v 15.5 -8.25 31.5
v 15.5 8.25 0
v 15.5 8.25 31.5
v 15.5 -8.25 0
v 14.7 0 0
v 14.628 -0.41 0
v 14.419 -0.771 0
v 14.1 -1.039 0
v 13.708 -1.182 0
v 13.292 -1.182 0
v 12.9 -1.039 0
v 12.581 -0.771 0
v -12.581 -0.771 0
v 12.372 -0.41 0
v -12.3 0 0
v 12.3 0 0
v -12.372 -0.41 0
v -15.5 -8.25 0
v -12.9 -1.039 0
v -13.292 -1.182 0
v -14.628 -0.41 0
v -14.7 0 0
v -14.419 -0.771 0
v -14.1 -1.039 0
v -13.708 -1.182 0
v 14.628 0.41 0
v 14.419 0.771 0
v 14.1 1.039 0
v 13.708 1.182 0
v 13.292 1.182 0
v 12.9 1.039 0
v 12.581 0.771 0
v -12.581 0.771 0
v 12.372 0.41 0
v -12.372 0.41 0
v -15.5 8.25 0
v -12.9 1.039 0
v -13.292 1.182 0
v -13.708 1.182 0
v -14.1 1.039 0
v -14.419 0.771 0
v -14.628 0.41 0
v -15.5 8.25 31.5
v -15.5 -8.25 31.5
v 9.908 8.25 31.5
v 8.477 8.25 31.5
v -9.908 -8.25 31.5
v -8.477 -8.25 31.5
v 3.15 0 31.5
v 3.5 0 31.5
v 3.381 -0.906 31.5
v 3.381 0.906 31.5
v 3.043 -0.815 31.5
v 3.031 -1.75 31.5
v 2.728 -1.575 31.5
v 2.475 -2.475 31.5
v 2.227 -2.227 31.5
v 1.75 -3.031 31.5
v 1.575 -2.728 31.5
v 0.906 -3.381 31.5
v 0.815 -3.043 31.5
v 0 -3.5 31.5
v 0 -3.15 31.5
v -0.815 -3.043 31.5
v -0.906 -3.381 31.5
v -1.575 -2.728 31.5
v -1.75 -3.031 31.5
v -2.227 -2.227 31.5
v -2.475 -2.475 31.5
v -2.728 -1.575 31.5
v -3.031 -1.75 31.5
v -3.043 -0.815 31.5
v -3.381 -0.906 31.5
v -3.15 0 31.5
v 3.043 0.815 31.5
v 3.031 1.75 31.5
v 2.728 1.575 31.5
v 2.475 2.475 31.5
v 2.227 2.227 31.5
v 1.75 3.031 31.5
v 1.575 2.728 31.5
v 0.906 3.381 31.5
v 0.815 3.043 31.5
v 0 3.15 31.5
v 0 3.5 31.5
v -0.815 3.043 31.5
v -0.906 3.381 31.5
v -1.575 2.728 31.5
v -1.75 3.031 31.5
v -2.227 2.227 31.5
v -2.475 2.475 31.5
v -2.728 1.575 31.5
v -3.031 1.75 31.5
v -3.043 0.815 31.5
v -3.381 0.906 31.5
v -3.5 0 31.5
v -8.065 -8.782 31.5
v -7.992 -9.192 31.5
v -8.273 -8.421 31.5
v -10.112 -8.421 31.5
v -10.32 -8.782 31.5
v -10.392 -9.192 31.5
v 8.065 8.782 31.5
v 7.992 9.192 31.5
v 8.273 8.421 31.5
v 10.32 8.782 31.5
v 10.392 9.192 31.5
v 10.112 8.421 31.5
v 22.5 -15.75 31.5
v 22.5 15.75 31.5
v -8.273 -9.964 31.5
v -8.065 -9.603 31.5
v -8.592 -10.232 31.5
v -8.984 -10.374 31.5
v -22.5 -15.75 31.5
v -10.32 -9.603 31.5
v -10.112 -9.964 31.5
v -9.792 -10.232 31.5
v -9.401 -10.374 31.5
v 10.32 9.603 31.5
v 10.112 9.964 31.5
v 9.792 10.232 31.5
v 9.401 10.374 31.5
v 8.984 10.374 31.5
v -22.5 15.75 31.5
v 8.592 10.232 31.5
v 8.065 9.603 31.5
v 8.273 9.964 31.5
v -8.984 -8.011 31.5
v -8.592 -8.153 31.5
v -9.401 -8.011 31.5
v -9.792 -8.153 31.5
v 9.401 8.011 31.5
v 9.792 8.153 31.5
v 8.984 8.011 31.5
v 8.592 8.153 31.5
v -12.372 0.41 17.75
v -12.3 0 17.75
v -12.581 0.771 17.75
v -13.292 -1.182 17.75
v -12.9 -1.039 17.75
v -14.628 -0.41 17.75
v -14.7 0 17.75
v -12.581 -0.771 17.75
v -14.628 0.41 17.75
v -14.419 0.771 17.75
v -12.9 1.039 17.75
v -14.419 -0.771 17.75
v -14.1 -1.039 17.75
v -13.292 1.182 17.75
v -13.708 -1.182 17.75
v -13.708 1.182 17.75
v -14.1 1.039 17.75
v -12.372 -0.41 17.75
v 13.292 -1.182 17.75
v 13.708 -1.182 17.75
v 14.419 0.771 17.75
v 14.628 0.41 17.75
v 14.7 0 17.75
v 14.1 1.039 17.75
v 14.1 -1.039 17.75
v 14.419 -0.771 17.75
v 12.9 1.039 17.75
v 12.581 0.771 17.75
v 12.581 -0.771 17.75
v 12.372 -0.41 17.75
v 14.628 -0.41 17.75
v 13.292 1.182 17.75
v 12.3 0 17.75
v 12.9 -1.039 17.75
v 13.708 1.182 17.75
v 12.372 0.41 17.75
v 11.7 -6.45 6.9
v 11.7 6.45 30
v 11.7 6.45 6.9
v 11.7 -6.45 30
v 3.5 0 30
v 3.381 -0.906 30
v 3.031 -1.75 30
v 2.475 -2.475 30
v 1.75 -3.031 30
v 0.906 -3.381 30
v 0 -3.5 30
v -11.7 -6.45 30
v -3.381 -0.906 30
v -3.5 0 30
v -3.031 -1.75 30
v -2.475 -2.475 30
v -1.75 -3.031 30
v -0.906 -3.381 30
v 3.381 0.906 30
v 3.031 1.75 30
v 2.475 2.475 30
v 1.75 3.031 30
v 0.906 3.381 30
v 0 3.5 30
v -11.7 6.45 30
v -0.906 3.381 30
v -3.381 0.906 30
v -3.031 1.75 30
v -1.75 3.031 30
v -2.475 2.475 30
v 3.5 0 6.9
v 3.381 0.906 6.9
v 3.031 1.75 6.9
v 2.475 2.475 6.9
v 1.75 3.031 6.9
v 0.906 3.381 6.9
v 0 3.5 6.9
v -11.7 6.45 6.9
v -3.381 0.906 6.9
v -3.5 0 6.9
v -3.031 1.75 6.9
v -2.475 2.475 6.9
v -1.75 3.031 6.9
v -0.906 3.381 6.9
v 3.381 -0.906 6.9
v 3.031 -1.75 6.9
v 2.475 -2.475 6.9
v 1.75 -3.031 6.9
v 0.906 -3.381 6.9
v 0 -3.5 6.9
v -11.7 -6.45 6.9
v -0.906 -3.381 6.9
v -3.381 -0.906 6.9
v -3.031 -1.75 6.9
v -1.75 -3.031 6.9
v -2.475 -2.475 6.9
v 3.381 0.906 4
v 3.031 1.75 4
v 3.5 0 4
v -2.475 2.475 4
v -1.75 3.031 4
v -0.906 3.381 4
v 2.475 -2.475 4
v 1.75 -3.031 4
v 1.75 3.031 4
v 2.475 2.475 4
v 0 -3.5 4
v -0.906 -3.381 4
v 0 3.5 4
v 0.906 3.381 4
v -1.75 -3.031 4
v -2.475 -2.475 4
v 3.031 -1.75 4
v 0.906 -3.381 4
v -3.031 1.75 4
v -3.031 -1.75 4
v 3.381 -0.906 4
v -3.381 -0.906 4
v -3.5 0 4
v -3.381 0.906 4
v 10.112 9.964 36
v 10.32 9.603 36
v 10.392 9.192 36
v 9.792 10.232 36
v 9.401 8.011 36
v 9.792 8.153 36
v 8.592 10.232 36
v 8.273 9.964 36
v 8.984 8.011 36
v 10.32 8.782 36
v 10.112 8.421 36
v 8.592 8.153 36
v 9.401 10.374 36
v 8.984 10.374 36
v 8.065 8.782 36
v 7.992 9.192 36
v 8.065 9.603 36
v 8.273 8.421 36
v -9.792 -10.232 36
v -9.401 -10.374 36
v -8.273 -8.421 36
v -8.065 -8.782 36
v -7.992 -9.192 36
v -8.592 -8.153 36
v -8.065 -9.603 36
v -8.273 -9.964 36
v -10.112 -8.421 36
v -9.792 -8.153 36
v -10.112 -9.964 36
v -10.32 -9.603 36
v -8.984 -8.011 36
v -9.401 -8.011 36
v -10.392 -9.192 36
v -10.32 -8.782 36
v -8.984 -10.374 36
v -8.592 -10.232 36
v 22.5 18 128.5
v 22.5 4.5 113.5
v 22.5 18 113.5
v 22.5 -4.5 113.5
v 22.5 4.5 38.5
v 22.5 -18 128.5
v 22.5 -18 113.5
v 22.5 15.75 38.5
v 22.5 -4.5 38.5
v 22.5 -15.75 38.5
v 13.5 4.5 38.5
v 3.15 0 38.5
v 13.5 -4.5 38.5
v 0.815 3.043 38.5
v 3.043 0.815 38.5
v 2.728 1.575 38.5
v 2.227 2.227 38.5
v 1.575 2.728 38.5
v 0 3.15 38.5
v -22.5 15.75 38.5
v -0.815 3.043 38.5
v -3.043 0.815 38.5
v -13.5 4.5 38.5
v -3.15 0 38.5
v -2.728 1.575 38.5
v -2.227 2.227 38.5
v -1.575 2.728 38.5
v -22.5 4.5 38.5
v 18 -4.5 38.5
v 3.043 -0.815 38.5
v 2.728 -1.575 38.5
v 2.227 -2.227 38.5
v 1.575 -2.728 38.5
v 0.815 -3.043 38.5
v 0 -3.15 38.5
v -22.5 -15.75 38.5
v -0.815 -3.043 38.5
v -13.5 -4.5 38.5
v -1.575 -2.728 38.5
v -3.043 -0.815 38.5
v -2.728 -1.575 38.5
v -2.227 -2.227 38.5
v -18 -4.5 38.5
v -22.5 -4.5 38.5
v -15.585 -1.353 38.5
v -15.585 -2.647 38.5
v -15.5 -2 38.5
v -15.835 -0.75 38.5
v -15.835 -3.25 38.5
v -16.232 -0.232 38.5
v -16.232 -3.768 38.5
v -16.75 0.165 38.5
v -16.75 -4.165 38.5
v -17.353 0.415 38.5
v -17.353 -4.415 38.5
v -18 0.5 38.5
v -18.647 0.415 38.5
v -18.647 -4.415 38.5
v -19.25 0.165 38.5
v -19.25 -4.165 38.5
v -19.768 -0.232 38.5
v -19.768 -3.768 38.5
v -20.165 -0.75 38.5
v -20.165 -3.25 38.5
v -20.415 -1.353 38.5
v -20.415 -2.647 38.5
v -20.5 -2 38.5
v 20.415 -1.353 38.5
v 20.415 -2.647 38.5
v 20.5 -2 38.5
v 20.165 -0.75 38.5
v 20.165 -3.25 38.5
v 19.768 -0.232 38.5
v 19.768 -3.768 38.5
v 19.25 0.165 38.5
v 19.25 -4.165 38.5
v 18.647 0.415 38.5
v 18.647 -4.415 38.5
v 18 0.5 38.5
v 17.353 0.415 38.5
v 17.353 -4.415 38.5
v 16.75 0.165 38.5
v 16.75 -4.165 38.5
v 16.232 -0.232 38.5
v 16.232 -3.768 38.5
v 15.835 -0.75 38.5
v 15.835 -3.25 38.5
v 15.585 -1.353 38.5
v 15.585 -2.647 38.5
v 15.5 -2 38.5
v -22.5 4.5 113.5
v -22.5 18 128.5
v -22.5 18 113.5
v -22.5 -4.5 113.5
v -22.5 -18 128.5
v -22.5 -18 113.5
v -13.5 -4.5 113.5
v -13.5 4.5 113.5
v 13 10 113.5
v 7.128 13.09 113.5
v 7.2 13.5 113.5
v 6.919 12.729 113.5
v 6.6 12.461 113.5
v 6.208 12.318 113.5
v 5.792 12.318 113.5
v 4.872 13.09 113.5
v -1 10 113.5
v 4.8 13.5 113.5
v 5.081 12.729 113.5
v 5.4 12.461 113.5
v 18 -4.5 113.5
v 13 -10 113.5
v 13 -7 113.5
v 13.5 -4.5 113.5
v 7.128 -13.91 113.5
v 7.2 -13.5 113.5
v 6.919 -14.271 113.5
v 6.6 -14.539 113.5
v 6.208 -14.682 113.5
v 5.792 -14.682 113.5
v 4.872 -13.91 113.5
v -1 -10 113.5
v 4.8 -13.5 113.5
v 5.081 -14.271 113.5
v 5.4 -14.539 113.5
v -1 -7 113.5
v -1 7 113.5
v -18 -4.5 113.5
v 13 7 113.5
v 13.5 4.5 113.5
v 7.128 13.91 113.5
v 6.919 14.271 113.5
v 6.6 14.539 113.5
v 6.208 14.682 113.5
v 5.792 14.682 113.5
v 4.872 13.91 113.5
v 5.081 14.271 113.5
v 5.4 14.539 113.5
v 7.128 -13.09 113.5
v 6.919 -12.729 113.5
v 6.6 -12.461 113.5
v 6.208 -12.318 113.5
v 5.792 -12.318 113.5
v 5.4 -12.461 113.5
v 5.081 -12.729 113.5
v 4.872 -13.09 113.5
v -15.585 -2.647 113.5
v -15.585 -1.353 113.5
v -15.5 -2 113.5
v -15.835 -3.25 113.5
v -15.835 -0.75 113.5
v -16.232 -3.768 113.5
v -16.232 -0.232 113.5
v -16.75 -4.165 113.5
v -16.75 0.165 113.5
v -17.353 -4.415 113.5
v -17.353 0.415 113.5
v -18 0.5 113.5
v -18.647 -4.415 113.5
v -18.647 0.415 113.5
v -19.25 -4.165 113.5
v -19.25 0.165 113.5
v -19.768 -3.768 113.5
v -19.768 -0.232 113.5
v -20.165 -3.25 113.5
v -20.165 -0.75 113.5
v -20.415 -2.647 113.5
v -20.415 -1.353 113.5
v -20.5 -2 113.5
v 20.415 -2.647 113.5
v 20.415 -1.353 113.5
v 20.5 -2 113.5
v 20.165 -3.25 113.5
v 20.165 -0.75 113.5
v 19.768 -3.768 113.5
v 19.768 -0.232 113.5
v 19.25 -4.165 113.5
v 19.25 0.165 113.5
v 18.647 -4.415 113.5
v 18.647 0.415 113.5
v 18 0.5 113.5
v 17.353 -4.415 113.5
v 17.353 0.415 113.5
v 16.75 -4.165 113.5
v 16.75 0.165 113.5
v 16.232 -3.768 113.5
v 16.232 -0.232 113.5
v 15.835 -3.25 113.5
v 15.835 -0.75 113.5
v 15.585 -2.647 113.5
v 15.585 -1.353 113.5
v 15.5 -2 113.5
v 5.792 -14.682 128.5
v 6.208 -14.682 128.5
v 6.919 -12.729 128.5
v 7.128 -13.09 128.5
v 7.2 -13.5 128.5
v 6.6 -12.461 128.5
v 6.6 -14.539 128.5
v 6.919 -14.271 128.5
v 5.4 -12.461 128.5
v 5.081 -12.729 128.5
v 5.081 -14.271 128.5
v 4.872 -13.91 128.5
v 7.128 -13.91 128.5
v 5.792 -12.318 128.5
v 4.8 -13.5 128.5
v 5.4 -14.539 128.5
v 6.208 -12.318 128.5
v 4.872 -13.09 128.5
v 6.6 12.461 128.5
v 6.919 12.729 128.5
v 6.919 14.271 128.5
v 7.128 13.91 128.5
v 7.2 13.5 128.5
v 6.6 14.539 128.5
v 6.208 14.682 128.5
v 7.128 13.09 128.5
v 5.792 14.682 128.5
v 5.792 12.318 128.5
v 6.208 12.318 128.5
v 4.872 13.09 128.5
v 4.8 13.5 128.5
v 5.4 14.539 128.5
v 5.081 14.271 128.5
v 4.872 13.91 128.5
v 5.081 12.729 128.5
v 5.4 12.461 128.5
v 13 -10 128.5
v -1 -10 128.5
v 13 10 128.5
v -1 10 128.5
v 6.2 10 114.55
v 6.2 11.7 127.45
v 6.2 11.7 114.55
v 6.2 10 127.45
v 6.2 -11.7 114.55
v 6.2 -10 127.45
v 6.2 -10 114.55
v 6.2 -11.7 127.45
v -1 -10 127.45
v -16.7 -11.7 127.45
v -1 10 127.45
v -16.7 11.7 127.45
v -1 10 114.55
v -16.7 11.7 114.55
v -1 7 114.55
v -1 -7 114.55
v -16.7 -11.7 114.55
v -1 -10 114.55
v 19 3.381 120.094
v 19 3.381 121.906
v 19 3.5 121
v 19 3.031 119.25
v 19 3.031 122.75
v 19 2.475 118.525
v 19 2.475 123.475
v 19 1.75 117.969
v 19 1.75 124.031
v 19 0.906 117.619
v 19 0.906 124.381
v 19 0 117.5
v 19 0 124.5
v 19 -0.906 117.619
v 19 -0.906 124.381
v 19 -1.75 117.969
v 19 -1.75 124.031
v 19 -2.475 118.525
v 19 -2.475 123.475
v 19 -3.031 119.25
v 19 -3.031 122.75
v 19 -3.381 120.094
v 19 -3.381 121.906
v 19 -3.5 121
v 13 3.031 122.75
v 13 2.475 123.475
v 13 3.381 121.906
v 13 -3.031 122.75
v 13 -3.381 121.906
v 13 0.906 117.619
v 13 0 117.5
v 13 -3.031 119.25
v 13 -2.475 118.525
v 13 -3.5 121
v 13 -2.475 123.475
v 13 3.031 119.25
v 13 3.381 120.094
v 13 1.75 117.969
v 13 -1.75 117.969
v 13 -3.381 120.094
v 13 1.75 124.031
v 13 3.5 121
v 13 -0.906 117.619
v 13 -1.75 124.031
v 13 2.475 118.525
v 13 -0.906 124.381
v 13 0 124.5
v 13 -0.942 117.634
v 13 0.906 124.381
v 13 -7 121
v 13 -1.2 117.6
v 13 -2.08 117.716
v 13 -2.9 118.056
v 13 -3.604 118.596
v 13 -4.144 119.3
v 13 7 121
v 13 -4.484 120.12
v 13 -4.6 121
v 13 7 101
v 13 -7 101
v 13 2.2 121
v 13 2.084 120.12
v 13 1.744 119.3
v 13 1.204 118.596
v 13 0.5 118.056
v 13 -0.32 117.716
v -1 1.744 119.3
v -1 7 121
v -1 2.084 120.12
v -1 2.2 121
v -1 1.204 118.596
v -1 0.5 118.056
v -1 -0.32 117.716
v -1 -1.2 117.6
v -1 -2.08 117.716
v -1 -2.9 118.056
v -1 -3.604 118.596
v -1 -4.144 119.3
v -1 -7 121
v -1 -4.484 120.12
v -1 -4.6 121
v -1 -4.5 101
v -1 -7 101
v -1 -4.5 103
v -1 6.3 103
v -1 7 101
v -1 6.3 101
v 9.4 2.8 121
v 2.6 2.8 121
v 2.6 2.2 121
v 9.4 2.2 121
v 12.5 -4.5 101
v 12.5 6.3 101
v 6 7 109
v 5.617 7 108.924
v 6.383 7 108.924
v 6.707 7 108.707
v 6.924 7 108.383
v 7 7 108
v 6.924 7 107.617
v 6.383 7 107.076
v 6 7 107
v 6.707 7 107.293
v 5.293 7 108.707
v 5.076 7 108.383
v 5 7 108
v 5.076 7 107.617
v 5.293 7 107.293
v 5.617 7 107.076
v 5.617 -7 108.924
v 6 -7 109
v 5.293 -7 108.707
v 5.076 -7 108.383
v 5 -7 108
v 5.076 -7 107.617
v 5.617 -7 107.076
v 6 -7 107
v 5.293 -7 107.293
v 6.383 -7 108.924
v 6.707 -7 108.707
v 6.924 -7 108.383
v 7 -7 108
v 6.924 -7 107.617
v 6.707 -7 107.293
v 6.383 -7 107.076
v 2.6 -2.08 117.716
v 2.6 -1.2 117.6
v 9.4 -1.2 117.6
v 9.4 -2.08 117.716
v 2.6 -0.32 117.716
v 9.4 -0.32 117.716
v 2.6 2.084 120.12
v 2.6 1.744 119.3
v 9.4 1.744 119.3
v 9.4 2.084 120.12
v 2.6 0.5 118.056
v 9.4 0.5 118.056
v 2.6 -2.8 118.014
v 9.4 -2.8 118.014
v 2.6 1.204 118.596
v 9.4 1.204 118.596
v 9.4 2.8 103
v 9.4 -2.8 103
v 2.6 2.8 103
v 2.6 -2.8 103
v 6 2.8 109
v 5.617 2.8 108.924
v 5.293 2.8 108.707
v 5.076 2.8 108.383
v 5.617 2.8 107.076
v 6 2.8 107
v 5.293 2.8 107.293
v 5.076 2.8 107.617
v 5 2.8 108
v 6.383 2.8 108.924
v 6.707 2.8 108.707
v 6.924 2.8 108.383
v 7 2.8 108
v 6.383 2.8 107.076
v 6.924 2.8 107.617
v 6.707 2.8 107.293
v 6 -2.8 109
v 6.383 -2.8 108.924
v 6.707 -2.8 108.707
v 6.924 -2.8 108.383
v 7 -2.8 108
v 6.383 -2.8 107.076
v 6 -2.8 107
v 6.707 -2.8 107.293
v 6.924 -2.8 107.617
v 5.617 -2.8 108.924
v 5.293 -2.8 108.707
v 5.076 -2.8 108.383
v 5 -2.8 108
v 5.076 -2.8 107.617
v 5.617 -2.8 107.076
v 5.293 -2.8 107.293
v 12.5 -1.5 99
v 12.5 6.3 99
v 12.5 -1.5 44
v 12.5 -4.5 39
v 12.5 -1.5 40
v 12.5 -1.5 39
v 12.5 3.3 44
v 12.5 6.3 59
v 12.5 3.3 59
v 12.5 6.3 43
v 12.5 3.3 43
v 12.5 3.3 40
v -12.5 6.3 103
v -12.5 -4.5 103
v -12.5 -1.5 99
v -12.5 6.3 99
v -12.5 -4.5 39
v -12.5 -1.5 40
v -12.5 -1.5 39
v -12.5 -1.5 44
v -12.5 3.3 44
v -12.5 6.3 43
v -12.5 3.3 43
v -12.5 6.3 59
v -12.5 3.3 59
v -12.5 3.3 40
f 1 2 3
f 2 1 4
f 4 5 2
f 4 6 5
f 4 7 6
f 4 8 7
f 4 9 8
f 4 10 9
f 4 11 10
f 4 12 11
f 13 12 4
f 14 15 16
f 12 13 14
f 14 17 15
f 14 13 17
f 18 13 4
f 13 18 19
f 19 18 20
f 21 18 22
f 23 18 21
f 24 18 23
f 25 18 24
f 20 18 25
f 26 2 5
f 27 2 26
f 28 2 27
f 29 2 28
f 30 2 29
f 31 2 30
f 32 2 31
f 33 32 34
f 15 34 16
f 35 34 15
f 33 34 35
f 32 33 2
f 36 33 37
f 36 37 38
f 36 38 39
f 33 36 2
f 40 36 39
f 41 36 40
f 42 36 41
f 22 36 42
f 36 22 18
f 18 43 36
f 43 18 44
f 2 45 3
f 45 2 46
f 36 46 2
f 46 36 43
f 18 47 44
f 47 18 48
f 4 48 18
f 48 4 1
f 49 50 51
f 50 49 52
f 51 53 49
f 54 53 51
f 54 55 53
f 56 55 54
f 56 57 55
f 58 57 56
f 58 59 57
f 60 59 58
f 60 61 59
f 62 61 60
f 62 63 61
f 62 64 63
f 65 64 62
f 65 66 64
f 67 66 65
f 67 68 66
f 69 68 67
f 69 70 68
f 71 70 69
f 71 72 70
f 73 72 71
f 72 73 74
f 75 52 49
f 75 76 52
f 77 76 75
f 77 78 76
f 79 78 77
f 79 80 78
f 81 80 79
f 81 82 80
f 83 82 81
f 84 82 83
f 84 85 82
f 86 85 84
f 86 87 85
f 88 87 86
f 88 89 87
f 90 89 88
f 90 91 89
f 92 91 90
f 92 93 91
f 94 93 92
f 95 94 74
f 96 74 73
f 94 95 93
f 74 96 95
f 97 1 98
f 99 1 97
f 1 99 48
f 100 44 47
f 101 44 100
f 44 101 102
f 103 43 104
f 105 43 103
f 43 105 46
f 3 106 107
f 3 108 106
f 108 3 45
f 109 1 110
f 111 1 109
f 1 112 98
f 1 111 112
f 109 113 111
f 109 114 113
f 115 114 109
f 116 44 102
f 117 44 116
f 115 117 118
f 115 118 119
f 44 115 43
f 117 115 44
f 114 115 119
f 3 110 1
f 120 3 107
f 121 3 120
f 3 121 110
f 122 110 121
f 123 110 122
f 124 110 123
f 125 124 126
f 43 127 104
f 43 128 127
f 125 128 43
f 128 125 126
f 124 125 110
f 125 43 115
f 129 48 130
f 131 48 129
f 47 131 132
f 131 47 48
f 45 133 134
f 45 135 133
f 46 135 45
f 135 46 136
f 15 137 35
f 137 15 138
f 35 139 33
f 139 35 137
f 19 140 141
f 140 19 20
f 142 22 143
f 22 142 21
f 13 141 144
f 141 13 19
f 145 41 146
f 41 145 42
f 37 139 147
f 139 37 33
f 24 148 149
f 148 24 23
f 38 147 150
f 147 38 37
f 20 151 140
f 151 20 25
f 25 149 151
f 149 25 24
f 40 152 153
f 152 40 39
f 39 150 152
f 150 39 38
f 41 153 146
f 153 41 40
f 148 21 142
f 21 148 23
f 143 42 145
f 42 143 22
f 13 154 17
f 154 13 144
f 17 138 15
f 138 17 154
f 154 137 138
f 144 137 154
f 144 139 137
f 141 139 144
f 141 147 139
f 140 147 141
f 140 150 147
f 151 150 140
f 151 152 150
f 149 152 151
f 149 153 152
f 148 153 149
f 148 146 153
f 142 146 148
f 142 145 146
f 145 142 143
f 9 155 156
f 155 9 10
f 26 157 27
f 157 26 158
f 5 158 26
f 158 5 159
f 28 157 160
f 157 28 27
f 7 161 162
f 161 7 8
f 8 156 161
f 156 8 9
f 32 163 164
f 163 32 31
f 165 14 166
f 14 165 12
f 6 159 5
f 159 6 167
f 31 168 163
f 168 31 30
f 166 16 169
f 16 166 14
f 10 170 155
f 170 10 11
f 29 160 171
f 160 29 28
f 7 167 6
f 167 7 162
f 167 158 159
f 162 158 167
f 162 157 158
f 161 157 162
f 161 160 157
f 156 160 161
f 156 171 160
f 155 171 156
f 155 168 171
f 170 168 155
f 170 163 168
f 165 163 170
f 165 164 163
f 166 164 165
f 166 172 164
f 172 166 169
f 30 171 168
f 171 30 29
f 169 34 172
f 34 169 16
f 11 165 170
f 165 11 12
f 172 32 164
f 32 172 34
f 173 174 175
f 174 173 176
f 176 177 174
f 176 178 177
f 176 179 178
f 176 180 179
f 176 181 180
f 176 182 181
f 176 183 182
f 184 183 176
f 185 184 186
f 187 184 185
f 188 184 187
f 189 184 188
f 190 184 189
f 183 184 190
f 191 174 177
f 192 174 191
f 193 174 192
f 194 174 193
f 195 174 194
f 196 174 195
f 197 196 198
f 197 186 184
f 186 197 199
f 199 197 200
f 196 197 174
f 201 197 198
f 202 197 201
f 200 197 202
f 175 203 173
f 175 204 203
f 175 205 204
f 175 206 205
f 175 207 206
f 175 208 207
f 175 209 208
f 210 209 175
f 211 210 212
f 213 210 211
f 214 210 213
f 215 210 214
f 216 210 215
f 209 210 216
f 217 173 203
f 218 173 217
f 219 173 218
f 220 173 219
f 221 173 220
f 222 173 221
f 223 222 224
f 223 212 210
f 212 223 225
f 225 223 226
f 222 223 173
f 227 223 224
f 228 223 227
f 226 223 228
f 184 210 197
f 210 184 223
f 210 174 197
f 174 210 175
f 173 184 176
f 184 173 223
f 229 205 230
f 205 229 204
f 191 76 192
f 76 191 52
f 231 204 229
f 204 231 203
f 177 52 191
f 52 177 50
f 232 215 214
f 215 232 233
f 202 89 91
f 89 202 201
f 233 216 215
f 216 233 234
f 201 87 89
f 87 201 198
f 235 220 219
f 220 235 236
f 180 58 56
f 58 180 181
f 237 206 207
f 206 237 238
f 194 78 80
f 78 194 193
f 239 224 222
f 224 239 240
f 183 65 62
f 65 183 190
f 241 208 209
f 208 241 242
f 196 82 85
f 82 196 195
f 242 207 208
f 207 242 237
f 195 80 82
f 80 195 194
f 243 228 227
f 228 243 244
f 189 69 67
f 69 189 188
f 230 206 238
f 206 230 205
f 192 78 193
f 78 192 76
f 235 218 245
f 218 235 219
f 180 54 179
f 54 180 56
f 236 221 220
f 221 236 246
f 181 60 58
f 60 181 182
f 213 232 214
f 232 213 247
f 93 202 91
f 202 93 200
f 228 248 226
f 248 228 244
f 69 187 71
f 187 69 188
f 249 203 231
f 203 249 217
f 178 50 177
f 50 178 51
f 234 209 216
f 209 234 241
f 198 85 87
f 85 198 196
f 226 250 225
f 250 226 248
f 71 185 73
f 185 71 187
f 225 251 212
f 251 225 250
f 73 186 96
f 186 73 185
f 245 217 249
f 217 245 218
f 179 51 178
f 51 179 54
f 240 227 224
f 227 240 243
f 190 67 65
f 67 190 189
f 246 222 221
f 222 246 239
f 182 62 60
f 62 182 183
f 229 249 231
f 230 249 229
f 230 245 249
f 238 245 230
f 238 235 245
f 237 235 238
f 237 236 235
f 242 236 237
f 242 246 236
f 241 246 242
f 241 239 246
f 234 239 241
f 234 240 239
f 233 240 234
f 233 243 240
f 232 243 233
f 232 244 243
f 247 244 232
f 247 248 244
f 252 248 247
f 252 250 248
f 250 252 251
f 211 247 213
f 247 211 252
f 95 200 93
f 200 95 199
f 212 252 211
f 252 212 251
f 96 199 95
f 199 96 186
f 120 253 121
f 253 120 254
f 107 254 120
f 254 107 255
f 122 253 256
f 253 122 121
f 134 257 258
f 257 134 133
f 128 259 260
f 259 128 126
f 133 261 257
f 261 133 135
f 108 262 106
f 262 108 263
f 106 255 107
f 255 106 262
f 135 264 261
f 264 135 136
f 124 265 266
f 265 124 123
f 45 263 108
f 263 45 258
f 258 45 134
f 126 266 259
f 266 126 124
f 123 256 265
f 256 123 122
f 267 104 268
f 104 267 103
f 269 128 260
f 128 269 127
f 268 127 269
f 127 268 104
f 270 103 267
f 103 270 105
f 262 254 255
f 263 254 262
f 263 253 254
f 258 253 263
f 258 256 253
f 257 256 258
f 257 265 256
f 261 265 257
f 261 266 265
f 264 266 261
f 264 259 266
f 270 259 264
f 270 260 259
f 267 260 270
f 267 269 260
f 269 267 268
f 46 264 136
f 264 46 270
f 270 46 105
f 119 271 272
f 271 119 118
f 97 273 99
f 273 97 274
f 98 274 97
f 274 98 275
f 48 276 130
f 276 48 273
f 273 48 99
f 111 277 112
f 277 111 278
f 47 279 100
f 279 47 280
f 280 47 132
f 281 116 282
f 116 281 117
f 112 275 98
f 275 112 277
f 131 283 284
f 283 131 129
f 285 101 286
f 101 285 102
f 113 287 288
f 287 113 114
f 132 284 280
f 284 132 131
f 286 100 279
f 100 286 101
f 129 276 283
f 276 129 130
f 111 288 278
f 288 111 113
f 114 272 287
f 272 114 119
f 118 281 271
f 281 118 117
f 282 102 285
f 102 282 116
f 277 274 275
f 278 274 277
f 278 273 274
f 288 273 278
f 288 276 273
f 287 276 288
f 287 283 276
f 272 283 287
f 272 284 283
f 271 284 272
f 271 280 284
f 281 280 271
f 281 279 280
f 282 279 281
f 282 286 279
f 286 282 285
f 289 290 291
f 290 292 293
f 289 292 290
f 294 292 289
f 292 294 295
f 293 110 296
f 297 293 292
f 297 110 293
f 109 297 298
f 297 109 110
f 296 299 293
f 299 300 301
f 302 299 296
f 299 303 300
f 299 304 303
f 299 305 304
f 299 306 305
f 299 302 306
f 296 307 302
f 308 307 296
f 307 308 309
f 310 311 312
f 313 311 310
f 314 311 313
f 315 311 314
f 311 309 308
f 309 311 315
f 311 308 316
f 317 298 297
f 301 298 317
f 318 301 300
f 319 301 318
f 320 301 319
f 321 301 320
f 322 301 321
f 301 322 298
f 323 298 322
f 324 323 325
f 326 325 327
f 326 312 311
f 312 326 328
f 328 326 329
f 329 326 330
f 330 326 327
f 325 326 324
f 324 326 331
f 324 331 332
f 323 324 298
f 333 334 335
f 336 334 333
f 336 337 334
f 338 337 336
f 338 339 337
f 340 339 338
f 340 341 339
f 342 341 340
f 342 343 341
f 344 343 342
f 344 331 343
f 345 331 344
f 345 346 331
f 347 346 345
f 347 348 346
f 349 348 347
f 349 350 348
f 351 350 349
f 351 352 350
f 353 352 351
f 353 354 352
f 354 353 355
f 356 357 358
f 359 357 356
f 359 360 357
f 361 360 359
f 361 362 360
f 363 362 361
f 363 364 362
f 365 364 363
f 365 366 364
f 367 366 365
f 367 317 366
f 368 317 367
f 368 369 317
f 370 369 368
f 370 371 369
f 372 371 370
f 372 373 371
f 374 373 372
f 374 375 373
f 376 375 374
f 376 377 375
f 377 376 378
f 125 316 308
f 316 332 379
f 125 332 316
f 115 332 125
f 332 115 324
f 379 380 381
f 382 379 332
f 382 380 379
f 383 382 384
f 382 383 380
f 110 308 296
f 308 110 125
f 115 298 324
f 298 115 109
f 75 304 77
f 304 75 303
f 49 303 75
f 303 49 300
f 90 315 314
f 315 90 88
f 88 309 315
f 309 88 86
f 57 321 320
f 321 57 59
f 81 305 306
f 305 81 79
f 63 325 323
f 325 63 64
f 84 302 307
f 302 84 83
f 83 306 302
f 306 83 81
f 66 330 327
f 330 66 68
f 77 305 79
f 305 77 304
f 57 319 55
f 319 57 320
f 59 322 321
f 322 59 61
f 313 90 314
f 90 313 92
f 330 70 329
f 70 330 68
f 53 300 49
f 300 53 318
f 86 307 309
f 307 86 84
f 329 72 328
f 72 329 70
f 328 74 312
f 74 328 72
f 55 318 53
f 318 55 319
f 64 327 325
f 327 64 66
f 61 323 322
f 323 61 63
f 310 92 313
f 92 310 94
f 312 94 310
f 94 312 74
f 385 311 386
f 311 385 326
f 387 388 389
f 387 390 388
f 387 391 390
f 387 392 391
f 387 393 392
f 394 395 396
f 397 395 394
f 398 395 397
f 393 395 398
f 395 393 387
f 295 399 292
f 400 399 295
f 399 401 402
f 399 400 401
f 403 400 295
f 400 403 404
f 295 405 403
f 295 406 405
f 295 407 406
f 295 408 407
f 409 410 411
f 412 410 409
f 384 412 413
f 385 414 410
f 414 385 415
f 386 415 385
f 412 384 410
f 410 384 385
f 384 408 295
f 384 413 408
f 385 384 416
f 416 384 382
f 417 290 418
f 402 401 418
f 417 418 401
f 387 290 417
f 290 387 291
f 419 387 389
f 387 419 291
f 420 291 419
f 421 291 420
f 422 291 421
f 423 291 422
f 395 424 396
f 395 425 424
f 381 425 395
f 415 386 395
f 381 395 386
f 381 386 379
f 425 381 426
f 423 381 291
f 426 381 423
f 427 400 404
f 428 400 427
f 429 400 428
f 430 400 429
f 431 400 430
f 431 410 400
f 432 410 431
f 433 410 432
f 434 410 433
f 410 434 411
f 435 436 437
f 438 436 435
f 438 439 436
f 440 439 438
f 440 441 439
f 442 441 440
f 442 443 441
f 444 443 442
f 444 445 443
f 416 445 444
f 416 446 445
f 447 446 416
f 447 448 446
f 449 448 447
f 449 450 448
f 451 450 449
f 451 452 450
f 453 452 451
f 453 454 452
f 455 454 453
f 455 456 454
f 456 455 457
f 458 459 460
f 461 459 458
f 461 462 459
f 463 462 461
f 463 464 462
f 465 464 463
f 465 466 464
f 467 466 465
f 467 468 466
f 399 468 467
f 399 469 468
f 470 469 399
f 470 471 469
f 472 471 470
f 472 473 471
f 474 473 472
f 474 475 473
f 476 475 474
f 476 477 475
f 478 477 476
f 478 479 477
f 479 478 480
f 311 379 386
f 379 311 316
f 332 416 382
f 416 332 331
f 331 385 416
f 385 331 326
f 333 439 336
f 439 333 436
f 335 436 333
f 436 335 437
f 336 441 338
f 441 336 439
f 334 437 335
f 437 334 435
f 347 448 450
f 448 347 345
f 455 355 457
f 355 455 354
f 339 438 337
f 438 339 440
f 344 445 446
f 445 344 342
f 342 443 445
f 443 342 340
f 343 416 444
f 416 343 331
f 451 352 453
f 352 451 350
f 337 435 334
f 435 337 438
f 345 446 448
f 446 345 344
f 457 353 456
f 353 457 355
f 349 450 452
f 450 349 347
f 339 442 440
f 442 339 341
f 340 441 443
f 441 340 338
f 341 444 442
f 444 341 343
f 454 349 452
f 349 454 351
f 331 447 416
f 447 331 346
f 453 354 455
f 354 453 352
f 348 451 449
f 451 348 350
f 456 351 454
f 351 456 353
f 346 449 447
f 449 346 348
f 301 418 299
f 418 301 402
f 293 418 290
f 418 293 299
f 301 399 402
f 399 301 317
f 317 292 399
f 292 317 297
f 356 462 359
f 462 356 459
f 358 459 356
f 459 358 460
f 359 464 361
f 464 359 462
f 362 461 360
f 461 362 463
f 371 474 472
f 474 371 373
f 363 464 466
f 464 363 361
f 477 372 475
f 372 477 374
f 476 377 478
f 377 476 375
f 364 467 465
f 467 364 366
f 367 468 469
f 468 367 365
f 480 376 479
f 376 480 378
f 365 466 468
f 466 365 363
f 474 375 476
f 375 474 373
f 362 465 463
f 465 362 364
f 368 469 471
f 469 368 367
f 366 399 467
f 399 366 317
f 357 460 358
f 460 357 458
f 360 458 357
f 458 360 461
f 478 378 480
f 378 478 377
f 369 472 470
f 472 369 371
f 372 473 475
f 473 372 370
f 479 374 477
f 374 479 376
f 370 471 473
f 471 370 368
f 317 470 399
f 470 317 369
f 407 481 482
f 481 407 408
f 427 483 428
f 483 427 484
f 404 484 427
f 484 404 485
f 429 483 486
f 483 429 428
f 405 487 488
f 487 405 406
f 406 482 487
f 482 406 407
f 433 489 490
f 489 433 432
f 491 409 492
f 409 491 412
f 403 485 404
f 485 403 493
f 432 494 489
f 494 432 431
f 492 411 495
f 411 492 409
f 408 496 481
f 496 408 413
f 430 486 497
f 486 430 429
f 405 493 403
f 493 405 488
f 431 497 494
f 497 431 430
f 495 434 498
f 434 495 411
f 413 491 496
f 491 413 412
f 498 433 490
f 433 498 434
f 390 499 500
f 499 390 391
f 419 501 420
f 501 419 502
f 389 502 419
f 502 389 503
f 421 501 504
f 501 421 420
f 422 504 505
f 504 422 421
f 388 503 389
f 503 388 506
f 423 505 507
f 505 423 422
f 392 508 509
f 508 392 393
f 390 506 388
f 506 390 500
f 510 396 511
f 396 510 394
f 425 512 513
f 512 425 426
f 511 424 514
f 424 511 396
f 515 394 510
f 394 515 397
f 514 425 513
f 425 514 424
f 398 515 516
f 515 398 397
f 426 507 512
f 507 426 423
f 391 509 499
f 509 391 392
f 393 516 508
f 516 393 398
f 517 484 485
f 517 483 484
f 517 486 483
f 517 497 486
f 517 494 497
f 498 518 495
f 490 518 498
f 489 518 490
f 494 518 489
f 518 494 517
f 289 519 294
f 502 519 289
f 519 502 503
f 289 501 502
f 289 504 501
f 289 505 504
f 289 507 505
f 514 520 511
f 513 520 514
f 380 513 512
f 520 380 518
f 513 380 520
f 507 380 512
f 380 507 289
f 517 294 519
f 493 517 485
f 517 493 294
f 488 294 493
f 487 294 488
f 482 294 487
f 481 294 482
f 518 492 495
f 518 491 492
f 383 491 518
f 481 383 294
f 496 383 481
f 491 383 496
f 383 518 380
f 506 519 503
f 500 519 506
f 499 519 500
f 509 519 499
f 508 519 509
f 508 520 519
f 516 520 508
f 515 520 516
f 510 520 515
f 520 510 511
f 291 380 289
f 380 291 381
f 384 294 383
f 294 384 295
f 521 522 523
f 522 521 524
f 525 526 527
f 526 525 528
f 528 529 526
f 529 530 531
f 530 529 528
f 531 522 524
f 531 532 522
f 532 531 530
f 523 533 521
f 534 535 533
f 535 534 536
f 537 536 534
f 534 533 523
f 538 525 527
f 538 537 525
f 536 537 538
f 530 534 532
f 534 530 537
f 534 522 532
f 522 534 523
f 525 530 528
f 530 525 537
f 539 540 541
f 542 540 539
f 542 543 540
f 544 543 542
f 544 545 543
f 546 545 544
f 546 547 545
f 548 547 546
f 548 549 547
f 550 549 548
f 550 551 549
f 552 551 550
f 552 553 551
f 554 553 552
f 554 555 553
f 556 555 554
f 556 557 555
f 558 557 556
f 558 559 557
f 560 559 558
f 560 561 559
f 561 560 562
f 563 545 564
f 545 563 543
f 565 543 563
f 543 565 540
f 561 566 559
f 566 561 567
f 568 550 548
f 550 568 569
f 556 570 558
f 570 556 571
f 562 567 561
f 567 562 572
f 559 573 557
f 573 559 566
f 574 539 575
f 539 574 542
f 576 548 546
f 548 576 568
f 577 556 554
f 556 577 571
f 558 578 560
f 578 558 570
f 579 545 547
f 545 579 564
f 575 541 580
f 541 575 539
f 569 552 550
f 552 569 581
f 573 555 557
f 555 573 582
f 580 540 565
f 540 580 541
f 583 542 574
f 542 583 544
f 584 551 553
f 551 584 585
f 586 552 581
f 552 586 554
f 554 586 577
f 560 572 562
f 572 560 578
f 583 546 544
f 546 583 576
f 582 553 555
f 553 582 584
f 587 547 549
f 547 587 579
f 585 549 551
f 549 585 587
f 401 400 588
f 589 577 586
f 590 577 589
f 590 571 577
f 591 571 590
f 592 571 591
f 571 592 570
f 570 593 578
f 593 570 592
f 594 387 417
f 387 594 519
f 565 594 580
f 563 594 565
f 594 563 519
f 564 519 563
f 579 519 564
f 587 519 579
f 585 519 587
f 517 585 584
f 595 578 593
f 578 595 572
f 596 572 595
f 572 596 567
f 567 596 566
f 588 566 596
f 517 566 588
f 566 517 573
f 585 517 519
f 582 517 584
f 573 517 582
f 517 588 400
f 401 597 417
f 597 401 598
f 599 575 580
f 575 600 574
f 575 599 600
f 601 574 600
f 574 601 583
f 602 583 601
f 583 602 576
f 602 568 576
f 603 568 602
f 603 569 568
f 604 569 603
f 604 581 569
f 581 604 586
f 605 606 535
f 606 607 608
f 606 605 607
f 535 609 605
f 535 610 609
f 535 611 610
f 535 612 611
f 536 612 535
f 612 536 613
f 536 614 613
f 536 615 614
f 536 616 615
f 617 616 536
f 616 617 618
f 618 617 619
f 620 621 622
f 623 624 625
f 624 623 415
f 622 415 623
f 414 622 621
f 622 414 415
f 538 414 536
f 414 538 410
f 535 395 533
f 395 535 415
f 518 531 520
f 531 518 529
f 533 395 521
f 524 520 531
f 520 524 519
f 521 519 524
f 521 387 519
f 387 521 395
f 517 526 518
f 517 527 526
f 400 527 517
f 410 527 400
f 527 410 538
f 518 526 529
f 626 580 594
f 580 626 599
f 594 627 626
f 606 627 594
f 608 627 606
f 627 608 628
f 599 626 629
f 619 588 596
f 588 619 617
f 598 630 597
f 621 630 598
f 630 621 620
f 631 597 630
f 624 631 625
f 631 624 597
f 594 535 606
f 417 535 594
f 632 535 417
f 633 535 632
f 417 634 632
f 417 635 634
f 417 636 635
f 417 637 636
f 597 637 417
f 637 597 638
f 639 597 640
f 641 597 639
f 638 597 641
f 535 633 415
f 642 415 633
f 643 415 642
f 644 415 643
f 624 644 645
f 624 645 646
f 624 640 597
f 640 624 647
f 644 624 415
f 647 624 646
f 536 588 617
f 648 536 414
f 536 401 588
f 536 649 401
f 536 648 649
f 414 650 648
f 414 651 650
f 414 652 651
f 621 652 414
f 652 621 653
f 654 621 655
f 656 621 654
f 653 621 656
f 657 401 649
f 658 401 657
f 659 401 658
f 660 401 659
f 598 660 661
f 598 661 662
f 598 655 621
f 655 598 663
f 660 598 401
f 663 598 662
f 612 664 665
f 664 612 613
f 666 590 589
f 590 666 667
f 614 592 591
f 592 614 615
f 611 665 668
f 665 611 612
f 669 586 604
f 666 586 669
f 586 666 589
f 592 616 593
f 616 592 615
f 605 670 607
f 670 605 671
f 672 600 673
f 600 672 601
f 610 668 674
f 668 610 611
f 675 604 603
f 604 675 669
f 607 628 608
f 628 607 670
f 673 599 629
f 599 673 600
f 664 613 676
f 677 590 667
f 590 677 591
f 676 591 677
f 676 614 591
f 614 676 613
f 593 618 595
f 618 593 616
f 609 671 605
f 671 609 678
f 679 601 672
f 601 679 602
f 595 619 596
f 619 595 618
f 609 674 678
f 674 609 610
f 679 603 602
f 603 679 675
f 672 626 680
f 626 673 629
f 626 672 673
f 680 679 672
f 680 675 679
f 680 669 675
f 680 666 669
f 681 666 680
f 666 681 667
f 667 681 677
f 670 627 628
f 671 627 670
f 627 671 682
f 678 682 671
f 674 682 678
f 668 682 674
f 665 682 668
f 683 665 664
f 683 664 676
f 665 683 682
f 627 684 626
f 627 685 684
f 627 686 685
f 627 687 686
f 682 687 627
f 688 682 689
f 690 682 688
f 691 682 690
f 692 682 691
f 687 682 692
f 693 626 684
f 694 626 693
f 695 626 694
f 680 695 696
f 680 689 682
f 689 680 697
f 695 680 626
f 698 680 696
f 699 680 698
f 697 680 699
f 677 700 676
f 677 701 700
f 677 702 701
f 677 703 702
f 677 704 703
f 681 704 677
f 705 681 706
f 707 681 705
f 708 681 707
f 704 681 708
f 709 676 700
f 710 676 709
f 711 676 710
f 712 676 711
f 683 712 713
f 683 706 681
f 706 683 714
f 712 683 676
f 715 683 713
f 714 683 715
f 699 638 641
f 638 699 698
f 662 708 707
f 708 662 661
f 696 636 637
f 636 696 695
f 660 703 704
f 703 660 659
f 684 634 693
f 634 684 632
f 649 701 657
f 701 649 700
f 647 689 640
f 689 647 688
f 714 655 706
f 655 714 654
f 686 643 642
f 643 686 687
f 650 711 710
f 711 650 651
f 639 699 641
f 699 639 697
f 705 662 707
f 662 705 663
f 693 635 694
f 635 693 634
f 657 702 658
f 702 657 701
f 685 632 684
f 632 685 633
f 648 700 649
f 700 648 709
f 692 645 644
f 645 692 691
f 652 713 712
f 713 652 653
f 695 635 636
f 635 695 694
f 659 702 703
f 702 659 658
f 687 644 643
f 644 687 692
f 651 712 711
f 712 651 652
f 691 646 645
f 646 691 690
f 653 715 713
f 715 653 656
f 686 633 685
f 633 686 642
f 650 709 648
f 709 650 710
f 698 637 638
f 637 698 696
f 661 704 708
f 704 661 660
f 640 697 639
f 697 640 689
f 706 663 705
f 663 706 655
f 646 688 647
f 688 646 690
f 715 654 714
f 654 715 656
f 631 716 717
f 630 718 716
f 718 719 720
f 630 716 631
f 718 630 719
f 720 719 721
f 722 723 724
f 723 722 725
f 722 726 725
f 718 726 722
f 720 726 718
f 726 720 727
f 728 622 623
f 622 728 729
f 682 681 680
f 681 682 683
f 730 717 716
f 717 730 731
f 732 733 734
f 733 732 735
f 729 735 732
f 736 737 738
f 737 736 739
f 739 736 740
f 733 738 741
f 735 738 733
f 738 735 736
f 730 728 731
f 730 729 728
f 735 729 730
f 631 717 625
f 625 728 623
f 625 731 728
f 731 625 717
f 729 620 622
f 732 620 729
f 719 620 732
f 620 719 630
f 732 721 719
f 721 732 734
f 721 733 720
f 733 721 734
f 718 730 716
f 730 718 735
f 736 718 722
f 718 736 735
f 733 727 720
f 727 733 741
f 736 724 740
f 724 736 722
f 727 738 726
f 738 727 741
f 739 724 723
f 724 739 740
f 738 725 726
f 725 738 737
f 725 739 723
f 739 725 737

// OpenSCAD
// =====================================================================
//  USB 摄像头两轴云台 · 参数化模型（OpenSCAD）
//  舵机：SG90 ×2（已按查证尺寸写死）；主控 ESP32-C6；结构件 A1 mini 打印
//
//  用法：
//   1. 装 OpenSCAD（https://openscad.org，免费）
//   2. 打开本文件，顶部 part 变量选 "preview" 先看整机组装
//   3. 核对镜头筒位置参数 lens_z_off（唯一影响前避让的估算量）
//   4. 把 part 改成 "base" / "uframe" / "cradle"，逐个导出 STL
//      （OpenSCAD 菜单 Design → Export → STL）
//   5. STL 丢进 Bambu Studio 切片打印
//
//  坐标约定：
//    Z = 竖直向上（pan 轴方向，底座在底部）
//    X = 左右（tilt 轴方向，水平）
//    Y = 前后（摄像头镜头朝向 +Y）
//
//  ---- 2026-10-20 重修记录（v2）----
//  1. tilt 舵机改为中心轴沿 X（旧版轴沿 Z，摄像头只能偏航不能俯仰）；
//     舵机在横梁内偏置，输出轴心对 X=+6，cradle 插座几乎正对轴、无悬臂。
//  2. 摄像头夹改 桥(压顶)+背板+底托+底前唇 四向夹持：
//     - 旧版前唇四面悬空（不连背板不连底托）→ 已用顶部横桥连成整体；
//     - 旧版底托 Y 深度只有 1.8mm（PCB 底边只搭 0.3mm）→ 改为 7.8mm 全断面承托；
//     - 旧版臂插槽宽 3.0mm（SG90 单臂宽约 5mm 插不进）→ 改为 5.6mm 并放宽摆动让位。
//  3. U 框底盘坐到 pan 舵机臂板顶面（旧版下沉 3mm 与舵机/围框干涉）。
//  4. 两根立柱加 Ø5 走线通孔（摄像头信号线穿到 C6）。
//  5. 横梁加厚到 15mm（旧 14mm 时舵机腔上下壁仅 0.55mm）。
// =====================================================================

// ===================== SG90 舵机参数（已查证，一般不用改） =====================
servo_l     = 23.0;   // 机身长（安装耳分布方向）
servo_w     = 12.5;   // 机身厚（窄边）
servo_h     = 22.5;   // 机身高（输出轴方向）
ear_dx      = 13.5;   // 安装耳孔中心到中心距离（两孔距 ≈ 27）
ear_d       = 2.8;    // 安装耳孔直径
shaft_d     = 5.5;    // 输出轴花键外径
shaft_top   = 3.0;    // 轴高出机身顶的高度
screw_d     = 2.4;    // 自攻螺丝过孔直径（PLA 里自攻，比耳孔略小）
horn_boss_d = 6.0;    // 舵机臂中心套外径（套在轴上）
horn_arm_r  = 13.0;   // 舵机臂螺丝孔中心半径
horn_hole_d = 2.4;    // 舵机臂螺丝孔直径
horn_arm_w  = 5.0;    // SG90 单臂宽度（估，插槽按 5+间隙开）

// ===================== 摄像头参数（2026-10-20 waner 实测提供） =====================
//  安装方式：PCB 竖放（55mm 长边竖直），元件面朝前(+Y)，镜头轴线水平朝 +Y
pcb_w  = 19;     // PCB 短边（水平 X）——商品页 55*19，已确认
pcb_h  = 55;     // PCB 长边（竖直 Z）——商品页 55*19，已确认
pcb_t  = 1.8;    // ✅实测：将近两毫米
lens_d = 14.5;   // ✅实测：镜头筒外径 1.4~1.5cm，取中值
lens_h = 25;     // ✅实测：镜头筒高出板面约 2.5cm（沿 Y 伸出）
led_h  = 18;     // LED 灯柱高出板面避让高度（仍待核：量一下灯柱高度）
lens_z_off = 12; // ⚠️ 镜头筒心到 PCB 顶边的距离（估 12；导出前在 OpenSCAD 里核对，
                 //    它决定桥/底前唇与镜头筒的避让，估错会撞筒）
usb_dir = "";    // ⚠️ 出线方向仍待定（从 PCB 底边出线时无需改造背板；
                 //    若从顶边/侧边出，需在背板对应位置开出线槽）

// ===================== 结构通用参数 =====================
wall   = 2.0;   // 壁厚
clear  = 0.4;   // 装配间隙
post_h = 75;    // 立柱高（摄像头吊在 tilt 轴下 ~79mm，加高避免扫到底座围框）
tilt_axis_x = 6; // tilt 舵机输出轴心 X 偏置（机身 X -16.5~6，腔左壁仍有 1.3mm；
                 //   轴心越靠左腔左壁越薄，+6 是横梁 ±18 内的极限位置）

// =====================================================================
//  选择导出零件：preview（整机组装预览）/ base / uframe / cradle
// =====================================================================
part = "preview";

if (part == "base")    base();
if (part == "uframe")  uframe();
if (part == "cradle")  cradle();
if (part == "preview") {
  base();
  // U 框坐在 pan 舵机臂板顶面上（臂板顶 = base_th 7 + servo_h 22.5 + 板厚 2 = 31.5）
  translate([0, 0, servo_h + 9]) uframe();
  // cradle 原点 = tilt 舵机输出轴高度
  //   = uframe 底 31.5 + 底盘 7 + 立柱 75 + 横梁半厚 7.5
  translate([0, 0, servo_h + 9 + 7 + post_h + 15/2]) cradle();
}

// ===================== 1. 底座（容纳 pan 舵机 + 耳朵孔 + 轴让位） =====================
module base() {
  base_th = 7;                       // 底板厚
  wall_h  = servo_h + 2;             // 围框高（略高于机身）
  outer_l = 2*ear_dx + 2*wall;       // 必须包住耳朵孔：27 + 4 = 31
  outer_w = servo_w + 2*wall;        // 12.5 + 4 = 16.5

  difference() {
    union() {
      // 底板
      translate([0, 0, base_th/2])
        cube([outer_l, outer_w, base_th], center=true);
      // 机身围框（顶开口，舵机轴朝上）
      translate([0, 0, base_th + wall_h/2])
        cube([outer_l, outer_w, wall_h], center=true);
    }
    // 机身容纳腔（顶部开口）
    translate([0, 0, base_th + (servo_h + clear)/2])
      cube([servo_l + clear, servo_w + clear, servo_h + clear + 0.2], center=true);
    // 安装耳孔（自攻螺丝，贯穿底板+围框，此处是实心材料）
    for (sx = [-1, 1])
      translate([sx*ear_dx, 0, 0])
        cylinder(h = base_th + wall_h + 4, d = screw_d, $fn=18, center=true);
    // 中心轴让位孔（给花键轴让位，不顶到）
    translate([0, 0, base_th + servo_h/2])
      cylinder(h = servo_h + 6, d = shaft_d + 1.5, $fn=24, center=true);
  }
}

// ===================== 2. U 型框（pan 臂接口 + 双立柱 + 顶部横梁装 tilt 舵机） =====================
//  tilt 舵机姿态（v2 重修）：轴沿 X（水平），可做俯仰；
//    机身：X = servo_h 22.5（轴方向）、Y = servo_l 23（耳朵方向）、Z = servo_w 12.5（窄边）
//    偏置：轴心 X=+6，耳朵在 Y±13.5，耳朵螺丝沿 Z 竖直拧入横梁
module uframe() {
  bottom_t = 7;                       // 底盘厚
  post_w   = 9;                       // 立柱宽
  top_t    = 15;                      // 横梁厚（容纳 tilt 舵机 12.5 窄边，壁 ~1.2）
  post_x   = pcb_w/2 + post_w/2 + 4;  // 立柱中心 X（跨在 PCB 两侧外，PCB 竖放宽 19）
  span_l   = 2*post_x + post_w;       // U 框外宽

  // ---- 底盘（接 pan 舵机臂；底 = 臂板顶面，坐正不沉）----
  difference() {
    translate([0, 0, bottom_t/2])
      cube([span_l, span_l*0.7, bottom_t], center=true);
    // 中心 boss 让位
    translate([0, 0, -1])
      cylinder(h = bottom_t + 2, d = horn_boss_d + 0.3, $fn=24);
    // 舵机臂固定孔（2 个，半径 horn_arm_r）
    for (a = [45, 225]) {            // 对角线布置，避开立柱
      translate([horn_arm_r*cos(a), horn_arm_r*sin(a), 0])
        cylinder(h = bottom_t + 2, d = horn_hole_d, $fn=18, center=true);
    }
  }

  // ---- 两根立柱（各打 Ø5 走线通孔：摄像头线穿到 C6）----
  for (sx = [-1, 1])
    difference() {
      translate([sx*post_x, 0, bottom_t + post_h/2])
        cube([post_w, post_w, post_h], center=true);
      // 走线孔（偏后侧 Y-2，线走背板后面那侧；两柱都打，实际用一侧）
      translate([sx*post_x, -2, bottom_t + post_h/2])
        cylinder(h = post_h + 2, d = 5, $fn=24, center=true);
    }

  // ---- 顶部横梁（装 tilt 舵机，轴沿 X）----
  translate([0, 0, bottom_t + post_h + top_t/2]) {
    difference() {
      cube([span_l, post_w + servo_l + 2*wall, top_t], center=true);
      // tilt 舵机机身腔：轴沿 X。X=22.9(轴向) / Y=23.4(长边+耳) / Z=12.9(窄边)
      // 偏置：轴心 X=+6，腔中心 X = tilt_axis_x - servo_h/2 = -5.25
      translate([tilt_axis_x - servo_h/2, 0, 0])
        cube([servo_h + clear, servo_l + clear, servo_w + clear], center=true);
      // 轴让位孔（轴从端面 X=6 伸出 3mm，孔通到横梁端面）
      translate([tilt_axis_x + 6, 0, 0])
        rotate([0, 90, 0])
          cylinder(h = 14, d = shaft_d + 1.5, $fn=24, center=true);
      // 朝下大开口（tilt 舵机臂穿出 + 全行程摆动让位）：
      // 臂 X±3.1、插座顶面扫掠 Y±7（tilt 20°~110° 时前/后角上抬 ~±6.6）
      translate([tilt_axis_x, 0, 0])
        cube([14, 20, top_t + 2], center=true);
      // tilt 舵机耳朵固定孔（螺丝沿 Z 竖直拧入横梁，耳朵在 Y±ear_dx）
      for (sy = [-1, 1])
        translate([tilt_axis_x, sy*ear_dx, 0])
          cylinder(h = top_t + 4, d = screw_d, $fn=18, center=true);
    }
  }
}

// ===================== 3. 摄像头夹（PCB 模组版，v2 重修） =====================
//  结构：挂在 tilt 舵机单臂下方——臂插入顶部插槽、一颗自攻螺丝横穿（沿 Y）固定；
//        PCB 由 顶部横桥（压顶边）+ 背板（贴后）+ 底托（承底）+ 底前唇（压下部前缘）
//        四向夹持，从下方插入。
//  坐标：cradle 原点 = tilt 舵机输出轴高度（偏置 X=+6，插座中心对齐轴心）
//  避让：桥/底前唇位置按镜头筒（Ø14.5、筒心在 PCB 顶下 lens_z_off）让位；
//        臂末端（r≈16）最低点在背板顶上方 1mm、桥顶上方 2mm。
module cradle() {
  t      = 3;
  insert = 22;                    // PCB 顶边到舵机轴的距离（容纳臂长 r≤18 + 桥）
  bw     = pcb_w + 2*t;           // 结构件总宽 = 25
  z_top  = -insert;               // PCB 顶边 z = -22
  z_bot  = z_top - pcb_h;         // PCB 底边 z = -77（坐在底托上）
  z_back_top = -19;               // 背板顶（伸进插座/桥里熔接 1mm）
  z_lens_c   = z_top - lens_z_off;          // 镜头筒心 z = -34

  union() {
    // --- 顶部舵机臂插座（z: -20 ~ 0，中心对齐 tilt 轴 X=+6；加深到 -20 与背板/桥熔接）---
    difference() {
      translate([tilt_axis_x, 0, -10]) cube([14, 14, 20], center=true);
      // boss 让位（轴沿 X；中心下移 1.2 包容臂上套筒）
      translate([tilt_axis_x, -1.2, 0]) rotate([0, 90, 0])
        cylinder(h = 16, d = horn_boss_d + 0.8, $fn = 24, center=true);
      // 臂槽（宽 horn_arm_w+0.6 容臂宽；厚 6.8 含 tilt 摆动让位；贯穿插座底）
      translate([tilt_axis_x, 0, -10])
        cube([6.8, horn_arm_w + 0.6, 22], center=true);
      // 横穿自攻螺丝孔（沿 Y，对正舵机臂螺丝孔 r=13 → z=-13）
      translate([tilt_axis_x, 0, -horn_arm_r]) rotate([90, 0, 0])
        cylinder(h = 20, d = 2.0, $fn = 16, center=true);
    }

    // --- 顶部横桥（底面贴 PCB 顶边，把背板/前侧连成整体；PCB 从桥下插入）---
    translate([0, pcb_t/2, z_top + 2])
      cube([bw, pcb_t + 2*t + 3, 4], center=true);

    // --- 背板（贴住 PCB 背面，上端伸进插座/桥里熔接，下端伸进底托 1mm）---
    translate([0, -3, (z_back_top + z_bot - 5)/2])
      cube([bw, t, (z_back_top - (z_bot - 5))], center=true);

    // --- 底托（PCB 底边坐这里，承重；Y 从背板后沿 -4.5 到前唇后沿 3.3 全断面）---
    translate([0, (pcb_t - t)/2, z_bot - 2])
      cube([bw, pcb_t + t + 3, 4], center=true);

    // --- 底前唇（下端坐进底托 1mm，压住 PCB 下部前缘；顶面避让镜头筒底）---
    lip_bot = z_bot - 1;                  // 唇底 -78，伸进底托（-81~-77）熔接
    lip_h   = 16;                         // 唇高，唇顶 -62
    // 避让自检（OpenSCAD 控制台打印）：唇顶 -62 应远低于镜头筒底（lens_z_off=12 时 -41.25）
    echo(str("底前唇顶 z=", lip_bot + lip_h, " | 镜头筒底 z=", z_lens_c - lens_d/2));
    translate([0, pcb_t + 1.5 + t/2, lip_bot + lip_h/2])
      cube([bw, t, lip_h], center=true);
  }
}
